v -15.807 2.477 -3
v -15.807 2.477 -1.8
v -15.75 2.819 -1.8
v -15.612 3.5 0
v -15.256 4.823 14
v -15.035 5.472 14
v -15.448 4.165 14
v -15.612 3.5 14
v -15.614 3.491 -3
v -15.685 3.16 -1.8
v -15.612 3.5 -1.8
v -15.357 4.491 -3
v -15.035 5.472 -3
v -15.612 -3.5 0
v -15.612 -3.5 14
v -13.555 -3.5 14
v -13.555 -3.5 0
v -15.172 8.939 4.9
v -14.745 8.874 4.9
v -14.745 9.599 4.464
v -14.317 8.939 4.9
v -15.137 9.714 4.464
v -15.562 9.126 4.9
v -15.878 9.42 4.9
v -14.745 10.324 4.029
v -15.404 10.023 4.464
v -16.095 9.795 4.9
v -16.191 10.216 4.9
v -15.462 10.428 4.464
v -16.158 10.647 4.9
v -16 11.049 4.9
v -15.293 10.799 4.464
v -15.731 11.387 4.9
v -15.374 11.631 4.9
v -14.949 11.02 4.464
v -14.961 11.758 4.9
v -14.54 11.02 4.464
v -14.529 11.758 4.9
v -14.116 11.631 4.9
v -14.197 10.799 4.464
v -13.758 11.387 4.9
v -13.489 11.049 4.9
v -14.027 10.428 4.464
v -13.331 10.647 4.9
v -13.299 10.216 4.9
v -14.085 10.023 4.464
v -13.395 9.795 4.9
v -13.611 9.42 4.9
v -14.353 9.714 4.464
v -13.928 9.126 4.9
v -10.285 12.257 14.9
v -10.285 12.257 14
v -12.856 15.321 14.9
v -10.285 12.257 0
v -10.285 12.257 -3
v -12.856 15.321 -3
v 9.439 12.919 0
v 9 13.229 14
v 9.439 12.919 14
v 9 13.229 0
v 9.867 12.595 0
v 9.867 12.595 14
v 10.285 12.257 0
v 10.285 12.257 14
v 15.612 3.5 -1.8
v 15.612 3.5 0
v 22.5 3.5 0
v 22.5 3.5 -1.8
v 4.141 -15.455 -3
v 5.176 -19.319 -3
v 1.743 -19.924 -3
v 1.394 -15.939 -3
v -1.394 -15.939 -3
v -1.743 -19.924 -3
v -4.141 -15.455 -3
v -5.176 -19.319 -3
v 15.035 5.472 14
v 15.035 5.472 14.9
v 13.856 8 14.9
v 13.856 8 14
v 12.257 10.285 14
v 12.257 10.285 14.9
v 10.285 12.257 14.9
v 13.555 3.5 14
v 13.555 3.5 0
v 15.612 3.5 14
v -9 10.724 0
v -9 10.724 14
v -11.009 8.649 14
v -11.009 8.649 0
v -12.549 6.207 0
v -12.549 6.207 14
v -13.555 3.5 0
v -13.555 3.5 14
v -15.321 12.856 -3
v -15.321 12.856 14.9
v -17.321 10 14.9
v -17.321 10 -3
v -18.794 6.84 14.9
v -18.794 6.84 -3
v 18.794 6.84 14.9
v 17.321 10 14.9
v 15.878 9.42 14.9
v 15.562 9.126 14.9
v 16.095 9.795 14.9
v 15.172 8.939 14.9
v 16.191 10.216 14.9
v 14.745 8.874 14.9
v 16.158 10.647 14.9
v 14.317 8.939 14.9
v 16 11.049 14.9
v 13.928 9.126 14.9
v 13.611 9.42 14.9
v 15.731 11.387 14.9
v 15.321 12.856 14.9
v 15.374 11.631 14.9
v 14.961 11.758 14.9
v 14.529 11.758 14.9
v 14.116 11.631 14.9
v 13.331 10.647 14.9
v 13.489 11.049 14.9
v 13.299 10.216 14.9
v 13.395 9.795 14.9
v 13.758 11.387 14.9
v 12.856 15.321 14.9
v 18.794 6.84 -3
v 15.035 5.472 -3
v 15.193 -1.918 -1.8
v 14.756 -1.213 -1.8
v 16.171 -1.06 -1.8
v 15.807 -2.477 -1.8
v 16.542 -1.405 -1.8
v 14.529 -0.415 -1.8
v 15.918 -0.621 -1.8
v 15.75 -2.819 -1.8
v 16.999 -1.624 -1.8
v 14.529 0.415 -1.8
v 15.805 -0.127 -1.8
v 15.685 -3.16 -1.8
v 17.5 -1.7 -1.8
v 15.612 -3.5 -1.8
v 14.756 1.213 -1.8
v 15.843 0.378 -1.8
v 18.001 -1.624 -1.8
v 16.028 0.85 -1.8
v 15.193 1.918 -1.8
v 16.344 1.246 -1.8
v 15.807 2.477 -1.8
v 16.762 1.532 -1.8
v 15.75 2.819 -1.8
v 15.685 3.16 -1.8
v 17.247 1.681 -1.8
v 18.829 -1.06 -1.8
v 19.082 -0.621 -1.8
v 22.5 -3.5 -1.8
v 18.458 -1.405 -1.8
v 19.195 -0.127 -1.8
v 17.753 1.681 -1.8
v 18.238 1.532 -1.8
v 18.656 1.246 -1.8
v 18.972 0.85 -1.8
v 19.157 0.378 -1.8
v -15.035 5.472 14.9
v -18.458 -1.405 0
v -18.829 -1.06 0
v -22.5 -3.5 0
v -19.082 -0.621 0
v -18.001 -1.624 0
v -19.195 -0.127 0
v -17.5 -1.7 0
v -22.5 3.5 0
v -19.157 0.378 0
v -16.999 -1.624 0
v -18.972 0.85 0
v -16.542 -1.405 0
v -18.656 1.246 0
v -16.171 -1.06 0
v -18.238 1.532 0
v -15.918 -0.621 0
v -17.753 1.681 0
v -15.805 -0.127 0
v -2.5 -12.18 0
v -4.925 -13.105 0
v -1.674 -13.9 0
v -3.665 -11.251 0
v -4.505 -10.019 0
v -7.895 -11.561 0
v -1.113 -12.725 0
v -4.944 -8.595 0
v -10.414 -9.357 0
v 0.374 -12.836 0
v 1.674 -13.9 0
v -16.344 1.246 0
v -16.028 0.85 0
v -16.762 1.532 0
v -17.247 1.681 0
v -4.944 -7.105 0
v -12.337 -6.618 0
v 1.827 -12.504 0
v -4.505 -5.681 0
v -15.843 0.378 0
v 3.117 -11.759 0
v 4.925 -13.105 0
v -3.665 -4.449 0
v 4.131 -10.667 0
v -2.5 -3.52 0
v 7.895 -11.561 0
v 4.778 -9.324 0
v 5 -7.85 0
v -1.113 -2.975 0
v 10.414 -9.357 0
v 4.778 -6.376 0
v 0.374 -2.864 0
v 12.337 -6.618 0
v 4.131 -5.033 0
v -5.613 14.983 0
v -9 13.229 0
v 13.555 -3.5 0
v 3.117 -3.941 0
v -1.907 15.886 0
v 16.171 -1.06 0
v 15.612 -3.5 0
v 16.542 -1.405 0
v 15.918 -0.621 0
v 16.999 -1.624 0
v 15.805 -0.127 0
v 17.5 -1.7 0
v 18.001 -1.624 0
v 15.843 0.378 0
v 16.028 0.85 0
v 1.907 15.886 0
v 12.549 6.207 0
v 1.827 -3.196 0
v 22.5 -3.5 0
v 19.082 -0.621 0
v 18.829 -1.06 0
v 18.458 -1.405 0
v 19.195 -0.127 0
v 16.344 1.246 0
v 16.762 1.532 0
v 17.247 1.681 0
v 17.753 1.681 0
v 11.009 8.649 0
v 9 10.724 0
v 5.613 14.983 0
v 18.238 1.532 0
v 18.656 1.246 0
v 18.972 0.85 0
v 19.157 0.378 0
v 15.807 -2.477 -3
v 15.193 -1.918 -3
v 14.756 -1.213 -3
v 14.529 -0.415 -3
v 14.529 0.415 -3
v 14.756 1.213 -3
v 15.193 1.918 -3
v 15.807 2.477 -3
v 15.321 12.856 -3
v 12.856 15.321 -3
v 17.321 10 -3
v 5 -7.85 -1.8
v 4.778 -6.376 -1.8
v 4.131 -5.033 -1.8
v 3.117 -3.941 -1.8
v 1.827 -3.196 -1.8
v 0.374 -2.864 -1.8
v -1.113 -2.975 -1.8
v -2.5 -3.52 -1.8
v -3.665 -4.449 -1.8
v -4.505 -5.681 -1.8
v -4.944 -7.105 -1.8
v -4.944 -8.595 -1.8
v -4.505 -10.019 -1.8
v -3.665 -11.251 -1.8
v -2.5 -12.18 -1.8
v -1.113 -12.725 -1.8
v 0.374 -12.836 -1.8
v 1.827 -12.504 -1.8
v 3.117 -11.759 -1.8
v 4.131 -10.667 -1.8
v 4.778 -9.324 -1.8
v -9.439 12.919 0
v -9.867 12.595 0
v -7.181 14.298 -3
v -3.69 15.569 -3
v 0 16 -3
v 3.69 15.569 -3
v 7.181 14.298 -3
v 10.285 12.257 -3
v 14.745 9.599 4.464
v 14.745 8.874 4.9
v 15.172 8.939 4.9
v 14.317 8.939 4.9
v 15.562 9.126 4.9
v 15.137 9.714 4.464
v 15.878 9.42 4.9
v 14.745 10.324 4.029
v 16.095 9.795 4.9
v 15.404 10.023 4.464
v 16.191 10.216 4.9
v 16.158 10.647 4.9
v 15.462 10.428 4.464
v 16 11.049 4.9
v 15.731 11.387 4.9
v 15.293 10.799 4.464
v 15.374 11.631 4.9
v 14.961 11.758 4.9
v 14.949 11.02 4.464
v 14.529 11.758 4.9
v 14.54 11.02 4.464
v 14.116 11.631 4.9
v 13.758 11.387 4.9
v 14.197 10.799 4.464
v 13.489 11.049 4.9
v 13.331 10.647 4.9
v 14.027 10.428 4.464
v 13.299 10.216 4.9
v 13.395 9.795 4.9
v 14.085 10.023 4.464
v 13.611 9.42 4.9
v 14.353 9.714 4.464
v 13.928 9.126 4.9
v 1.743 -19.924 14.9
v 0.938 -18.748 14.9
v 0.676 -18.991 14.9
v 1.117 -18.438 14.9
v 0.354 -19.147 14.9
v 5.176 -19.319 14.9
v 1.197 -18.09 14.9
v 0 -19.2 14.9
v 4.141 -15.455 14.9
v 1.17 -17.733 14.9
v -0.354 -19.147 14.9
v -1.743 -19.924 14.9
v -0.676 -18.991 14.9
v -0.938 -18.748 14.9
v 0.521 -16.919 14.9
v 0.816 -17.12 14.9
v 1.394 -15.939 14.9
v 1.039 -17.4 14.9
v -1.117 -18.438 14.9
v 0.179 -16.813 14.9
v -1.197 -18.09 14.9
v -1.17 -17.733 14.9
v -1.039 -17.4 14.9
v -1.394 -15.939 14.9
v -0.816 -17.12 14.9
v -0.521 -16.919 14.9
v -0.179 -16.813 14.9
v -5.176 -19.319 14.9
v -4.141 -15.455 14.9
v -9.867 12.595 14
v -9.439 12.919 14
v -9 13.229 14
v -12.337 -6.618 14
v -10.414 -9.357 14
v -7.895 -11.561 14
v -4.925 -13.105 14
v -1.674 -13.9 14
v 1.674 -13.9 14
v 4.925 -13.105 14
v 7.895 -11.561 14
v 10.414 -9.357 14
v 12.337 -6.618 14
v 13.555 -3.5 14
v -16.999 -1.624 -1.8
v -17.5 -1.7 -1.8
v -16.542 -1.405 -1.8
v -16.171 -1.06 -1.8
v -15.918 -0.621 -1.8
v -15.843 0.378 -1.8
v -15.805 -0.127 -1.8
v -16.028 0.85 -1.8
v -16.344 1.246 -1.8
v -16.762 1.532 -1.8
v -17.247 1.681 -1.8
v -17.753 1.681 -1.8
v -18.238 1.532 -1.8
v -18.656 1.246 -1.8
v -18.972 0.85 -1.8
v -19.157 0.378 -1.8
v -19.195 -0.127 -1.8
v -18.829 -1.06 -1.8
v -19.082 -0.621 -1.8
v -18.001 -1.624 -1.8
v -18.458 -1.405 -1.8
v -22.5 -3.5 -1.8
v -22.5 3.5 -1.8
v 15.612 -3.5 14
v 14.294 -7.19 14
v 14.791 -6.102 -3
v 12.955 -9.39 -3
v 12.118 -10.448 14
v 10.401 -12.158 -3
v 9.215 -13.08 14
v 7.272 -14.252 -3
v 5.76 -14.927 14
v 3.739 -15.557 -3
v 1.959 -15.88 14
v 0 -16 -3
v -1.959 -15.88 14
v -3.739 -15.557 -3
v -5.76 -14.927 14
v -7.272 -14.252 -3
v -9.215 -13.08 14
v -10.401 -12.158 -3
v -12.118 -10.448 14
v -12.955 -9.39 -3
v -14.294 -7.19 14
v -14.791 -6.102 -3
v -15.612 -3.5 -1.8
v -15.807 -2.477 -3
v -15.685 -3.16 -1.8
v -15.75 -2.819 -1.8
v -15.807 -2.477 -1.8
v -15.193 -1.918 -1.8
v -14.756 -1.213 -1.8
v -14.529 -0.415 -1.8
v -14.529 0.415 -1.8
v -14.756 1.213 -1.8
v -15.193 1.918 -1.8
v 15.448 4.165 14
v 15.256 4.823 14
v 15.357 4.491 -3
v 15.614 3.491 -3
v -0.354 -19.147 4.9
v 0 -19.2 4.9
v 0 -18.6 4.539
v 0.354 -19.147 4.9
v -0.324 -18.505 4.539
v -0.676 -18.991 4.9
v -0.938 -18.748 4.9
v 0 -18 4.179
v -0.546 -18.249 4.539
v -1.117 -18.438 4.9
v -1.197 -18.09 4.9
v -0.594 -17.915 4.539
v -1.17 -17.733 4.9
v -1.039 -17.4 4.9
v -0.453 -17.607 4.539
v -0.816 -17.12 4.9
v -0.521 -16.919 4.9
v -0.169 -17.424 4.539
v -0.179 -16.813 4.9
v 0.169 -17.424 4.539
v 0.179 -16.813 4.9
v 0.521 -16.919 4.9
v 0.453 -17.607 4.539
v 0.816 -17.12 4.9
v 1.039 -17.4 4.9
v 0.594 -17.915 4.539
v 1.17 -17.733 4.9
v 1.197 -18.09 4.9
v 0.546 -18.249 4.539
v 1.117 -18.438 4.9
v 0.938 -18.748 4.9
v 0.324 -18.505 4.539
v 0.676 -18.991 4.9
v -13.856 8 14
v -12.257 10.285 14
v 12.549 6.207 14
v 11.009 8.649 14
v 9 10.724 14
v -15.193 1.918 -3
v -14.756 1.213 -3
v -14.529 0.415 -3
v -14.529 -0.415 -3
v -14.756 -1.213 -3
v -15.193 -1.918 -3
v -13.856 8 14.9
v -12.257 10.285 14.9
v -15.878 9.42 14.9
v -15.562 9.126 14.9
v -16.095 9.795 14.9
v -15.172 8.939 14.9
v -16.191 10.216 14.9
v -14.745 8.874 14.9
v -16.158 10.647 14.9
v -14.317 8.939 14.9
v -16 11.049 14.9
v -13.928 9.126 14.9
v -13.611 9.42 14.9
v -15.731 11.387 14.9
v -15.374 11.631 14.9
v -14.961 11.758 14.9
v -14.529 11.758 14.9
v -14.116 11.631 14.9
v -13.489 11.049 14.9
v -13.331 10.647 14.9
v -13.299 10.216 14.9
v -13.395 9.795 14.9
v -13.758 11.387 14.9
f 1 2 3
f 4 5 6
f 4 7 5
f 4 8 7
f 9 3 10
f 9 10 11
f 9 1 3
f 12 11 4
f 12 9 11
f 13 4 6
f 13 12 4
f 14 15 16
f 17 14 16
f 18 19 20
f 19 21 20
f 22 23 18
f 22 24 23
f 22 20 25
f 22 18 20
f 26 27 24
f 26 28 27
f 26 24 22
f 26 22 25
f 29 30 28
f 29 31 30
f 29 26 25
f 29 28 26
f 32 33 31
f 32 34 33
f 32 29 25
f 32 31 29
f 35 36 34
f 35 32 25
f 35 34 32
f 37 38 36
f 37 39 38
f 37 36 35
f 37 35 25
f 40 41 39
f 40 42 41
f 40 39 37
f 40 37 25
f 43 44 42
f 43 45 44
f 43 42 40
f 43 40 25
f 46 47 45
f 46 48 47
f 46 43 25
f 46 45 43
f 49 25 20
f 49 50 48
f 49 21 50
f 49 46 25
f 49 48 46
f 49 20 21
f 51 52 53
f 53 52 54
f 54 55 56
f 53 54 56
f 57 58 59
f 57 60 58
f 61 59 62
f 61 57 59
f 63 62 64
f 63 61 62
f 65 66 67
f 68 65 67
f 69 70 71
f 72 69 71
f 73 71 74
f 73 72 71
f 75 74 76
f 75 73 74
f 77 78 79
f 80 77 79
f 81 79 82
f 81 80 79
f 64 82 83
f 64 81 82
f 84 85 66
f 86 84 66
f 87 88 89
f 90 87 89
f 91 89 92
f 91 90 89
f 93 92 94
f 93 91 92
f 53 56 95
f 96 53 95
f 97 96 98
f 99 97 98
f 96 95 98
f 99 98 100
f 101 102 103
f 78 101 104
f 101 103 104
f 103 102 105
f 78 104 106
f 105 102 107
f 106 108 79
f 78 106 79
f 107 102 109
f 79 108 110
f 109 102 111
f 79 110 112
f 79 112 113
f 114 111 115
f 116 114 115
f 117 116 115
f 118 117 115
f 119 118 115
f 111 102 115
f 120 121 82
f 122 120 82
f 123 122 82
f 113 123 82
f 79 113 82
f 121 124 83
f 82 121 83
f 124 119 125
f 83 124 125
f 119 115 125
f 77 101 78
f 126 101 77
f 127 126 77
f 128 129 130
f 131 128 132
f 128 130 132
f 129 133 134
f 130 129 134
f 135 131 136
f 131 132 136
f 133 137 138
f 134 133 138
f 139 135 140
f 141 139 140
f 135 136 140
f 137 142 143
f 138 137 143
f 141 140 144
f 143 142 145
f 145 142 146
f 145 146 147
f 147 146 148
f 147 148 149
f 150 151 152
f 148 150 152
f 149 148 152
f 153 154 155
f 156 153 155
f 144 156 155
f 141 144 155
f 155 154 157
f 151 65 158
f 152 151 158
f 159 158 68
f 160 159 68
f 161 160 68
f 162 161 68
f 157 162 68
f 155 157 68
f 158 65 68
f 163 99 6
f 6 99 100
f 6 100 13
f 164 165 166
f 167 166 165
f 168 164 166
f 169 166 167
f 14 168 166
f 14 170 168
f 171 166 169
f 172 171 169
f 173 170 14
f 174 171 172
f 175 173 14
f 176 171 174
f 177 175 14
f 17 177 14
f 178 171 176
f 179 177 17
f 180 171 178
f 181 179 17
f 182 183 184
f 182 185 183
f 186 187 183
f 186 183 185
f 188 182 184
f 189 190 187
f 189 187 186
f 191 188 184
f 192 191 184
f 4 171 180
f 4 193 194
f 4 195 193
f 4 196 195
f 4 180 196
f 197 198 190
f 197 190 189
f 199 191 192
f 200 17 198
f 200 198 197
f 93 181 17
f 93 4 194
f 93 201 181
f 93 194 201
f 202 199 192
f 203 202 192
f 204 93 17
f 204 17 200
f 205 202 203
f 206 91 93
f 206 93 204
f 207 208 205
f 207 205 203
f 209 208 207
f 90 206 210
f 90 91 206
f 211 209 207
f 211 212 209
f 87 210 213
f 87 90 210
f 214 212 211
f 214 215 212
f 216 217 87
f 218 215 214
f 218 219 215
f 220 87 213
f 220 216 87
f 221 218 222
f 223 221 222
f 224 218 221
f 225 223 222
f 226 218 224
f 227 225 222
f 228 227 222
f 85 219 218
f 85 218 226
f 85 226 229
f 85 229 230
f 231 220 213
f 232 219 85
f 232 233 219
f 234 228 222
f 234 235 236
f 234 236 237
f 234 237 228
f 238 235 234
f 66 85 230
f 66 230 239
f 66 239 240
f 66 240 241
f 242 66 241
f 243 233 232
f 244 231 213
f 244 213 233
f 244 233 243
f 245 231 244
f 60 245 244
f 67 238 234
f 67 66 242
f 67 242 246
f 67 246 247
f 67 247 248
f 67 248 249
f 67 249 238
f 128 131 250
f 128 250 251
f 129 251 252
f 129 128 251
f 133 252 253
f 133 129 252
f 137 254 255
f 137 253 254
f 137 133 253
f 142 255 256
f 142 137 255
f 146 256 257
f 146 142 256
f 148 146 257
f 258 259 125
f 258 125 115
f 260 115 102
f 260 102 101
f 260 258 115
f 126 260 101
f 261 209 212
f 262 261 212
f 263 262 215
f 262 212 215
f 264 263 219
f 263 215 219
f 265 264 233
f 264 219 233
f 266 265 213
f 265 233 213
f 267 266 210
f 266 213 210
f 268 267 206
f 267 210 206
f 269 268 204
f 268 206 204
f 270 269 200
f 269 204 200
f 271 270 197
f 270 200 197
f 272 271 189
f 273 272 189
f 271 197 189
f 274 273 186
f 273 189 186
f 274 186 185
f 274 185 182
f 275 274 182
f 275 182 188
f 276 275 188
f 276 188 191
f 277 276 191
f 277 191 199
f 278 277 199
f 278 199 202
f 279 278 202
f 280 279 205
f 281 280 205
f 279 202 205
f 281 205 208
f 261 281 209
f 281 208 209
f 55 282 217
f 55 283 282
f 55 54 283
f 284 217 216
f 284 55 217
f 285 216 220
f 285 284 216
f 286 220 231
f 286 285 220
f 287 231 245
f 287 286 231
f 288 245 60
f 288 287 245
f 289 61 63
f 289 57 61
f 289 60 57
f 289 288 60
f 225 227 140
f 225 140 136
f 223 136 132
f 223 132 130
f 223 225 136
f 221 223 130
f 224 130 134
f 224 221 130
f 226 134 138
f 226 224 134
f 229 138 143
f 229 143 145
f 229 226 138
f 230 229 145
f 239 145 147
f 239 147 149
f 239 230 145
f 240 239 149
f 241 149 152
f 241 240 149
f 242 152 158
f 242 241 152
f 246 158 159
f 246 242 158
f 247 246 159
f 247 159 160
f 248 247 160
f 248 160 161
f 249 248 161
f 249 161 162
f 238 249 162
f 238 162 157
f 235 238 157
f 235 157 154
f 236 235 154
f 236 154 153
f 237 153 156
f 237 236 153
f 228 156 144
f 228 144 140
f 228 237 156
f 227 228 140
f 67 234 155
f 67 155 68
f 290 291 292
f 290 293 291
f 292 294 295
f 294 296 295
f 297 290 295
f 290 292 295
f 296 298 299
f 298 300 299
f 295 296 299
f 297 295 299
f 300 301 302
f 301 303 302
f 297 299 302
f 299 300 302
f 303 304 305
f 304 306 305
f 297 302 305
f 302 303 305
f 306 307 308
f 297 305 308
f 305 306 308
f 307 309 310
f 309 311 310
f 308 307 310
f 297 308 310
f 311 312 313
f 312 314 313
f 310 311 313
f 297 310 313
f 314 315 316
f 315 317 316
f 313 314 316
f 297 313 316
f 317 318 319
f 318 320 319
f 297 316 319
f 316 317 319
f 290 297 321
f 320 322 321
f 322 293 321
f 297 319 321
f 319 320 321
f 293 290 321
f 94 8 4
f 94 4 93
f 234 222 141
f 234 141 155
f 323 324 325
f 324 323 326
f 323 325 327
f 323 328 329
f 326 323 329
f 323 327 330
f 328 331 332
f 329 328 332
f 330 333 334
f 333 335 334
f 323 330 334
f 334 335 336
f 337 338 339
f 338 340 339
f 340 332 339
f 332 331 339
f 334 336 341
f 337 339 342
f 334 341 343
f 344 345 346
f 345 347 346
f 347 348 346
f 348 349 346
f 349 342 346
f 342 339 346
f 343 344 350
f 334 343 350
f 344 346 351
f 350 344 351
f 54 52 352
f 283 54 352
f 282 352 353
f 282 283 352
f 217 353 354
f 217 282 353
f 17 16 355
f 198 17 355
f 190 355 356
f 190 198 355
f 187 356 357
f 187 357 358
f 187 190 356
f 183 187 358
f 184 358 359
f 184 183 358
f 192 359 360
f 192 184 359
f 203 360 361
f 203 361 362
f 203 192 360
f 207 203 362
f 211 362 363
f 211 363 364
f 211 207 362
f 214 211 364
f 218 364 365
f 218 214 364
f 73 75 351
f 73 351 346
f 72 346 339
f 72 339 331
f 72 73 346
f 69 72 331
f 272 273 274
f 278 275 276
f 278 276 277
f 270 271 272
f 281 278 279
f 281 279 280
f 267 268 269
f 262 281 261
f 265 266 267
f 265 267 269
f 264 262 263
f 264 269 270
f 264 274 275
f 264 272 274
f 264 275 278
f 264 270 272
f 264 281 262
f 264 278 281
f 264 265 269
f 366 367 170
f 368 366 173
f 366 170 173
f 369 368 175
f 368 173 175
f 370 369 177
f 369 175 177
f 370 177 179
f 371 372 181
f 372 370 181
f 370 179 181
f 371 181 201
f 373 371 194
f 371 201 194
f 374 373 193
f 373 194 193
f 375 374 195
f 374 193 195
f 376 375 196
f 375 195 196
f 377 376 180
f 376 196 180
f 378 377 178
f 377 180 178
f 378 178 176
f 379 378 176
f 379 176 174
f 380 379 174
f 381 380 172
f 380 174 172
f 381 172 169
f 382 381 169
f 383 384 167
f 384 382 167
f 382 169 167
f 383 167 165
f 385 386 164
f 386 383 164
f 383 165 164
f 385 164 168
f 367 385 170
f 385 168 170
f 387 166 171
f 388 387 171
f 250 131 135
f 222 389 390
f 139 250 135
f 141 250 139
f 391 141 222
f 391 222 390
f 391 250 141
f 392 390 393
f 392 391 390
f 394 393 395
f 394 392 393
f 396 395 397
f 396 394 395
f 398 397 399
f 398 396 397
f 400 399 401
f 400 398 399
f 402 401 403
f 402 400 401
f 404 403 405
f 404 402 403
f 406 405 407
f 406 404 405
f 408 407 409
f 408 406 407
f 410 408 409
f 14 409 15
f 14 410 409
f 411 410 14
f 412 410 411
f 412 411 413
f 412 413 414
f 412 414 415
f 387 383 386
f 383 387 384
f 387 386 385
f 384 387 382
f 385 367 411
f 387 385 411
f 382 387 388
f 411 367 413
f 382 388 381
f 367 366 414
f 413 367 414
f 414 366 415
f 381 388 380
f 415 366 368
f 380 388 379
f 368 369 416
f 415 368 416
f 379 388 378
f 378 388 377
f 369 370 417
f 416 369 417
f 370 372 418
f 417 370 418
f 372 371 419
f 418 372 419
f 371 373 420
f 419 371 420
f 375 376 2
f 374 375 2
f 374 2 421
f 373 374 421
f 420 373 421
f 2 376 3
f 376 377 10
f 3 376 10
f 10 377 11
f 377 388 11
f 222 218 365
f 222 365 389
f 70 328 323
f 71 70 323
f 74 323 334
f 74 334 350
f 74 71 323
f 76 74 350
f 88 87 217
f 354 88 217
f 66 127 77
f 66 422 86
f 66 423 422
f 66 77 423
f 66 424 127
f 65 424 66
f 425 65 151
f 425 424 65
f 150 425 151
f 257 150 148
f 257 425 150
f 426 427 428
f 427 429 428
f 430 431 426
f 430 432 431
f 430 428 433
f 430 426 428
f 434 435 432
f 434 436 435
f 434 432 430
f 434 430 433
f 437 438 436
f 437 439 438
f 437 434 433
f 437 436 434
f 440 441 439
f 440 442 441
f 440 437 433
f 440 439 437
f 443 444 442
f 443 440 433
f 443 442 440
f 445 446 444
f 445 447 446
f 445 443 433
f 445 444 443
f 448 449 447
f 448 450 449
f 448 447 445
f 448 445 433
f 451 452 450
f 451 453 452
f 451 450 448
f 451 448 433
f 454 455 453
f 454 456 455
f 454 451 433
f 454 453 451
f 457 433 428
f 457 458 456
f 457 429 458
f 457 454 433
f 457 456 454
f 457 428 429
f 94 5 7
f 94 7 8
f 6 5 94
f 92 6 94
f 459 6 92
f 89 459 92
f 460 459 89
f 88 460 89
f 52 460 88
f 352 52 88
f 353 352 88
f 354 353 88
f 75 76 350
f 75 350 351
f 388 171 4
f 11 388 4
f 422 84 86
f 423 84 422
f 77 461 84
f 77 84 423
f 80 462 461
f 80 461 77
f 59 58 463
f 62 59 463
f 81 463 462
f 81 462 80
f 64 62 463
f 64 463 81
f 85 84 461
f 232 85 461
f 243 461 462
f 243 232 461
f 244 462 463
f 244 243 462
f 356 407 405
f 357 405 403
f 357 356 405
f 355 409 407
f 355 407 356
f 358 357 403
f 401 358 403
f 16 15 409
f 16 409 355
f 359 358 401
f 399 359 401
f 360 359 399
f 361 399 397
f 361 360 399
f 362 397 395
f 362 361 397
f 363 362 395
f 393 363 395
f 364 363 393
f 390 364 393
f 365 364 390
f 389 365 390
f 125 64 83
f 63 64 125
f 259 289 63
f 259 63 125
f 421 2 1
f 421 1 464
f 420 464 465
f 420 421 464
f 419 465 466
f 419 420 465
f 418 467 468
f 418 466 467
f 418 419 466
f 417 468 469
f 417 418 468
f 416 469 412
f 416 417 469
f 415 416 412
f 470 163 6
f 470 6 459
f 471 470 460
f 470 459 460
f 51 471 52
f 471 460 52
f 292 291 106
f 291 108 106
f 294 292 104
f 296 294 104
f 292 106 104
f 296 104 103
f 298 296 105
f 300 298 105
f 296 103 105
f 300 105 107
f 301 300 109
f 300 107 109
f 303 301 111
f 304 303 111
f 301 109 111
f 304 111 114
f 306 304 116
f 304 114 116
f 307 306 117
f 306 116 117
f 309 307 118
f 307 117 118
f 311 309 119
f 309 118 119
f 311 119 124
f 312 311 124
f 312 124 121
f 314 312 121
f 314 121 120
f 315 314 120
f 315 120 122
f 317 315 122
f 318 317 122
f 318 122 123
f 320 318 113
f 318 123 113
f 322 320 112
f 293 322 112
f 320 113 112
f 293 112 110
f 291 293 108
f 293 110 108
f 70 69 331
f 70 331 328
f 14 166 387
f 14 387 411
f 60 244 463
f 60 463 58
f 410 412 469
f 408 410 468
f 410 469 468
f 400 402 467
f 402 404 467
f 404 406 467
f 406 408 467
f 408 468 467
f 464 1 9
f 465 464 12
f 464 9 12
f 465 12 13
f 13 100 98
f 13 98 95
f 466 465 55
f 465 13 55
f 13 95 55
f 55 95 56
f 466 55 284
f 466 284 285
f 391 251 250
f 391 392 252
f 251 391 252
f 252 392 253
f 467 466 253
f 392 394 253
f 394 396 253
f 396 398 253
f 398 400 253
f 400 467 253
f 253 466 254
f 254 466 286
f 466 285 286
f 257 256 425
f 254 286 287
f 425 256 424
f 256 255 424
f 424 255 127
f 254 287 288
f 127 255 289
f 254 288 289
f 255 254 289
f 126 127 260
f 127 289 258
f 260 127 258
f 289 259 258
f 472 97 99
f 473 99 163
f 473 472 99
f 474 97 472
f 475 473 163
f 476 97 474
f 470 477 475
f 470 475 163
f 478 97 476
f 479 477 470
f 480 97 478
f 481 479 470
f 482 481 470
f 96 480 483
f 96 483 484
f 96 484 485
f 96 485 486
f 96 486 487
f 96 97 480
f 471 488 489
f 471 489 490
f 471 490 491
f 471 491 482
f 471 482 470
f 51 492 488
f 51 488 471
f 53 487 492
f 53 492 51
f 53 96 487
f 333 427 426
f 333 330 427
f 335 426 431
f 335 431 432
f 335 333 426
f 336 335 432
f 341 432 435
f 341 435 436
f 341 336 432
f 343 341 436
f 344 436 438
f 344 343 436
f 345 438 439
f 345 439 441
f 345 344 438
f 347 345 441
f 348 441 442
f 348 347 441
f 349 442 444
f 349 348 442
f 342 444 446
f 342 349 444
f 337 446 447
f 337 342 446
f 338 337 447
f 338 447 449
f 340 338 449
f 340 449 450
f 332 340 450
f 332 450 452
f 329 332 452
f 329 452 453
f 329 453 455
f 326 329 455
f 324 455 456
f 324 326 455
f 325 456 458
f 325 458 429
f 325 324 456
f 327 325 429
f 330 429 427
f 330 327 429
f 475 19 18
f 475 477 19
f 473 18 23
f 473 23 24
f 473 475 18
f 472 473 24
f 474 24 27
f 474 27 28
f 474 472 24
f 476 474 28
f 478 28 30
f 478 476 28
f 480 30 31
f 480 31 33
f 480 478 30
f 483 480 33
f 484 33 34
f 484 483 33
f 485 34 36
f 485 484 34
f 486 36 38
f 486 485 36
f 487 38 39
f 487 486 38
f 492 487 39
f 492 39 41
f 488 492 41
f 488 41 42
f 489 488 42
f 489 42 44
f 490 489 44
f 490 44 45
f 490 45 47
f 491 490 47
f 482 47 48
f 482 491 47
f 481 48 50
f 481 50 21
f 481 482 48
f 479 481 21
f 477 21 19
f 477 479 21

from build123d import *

# Parameters (mm, degrees)
SCHIZZO1_R                   = 16
SCHIZZO1_R_2                 = 14
ESTRUSIONE_ESTRUSIONE1_DEPTH = 14
ESTRUSIONE_ESTRUSIONE2_START = 3
SCHIZZO2_R                   = 16
ESTRUSIONE_ESTRUSIONE2_DEPTH = 3
SCHIZZO3_W                   = 32
SCHIZZO3_H                   = 7
TAGLIO_ESTRUSIONE1_DEPTH     = 14
SCHIZZO4_W                   = 45
SCHIZZO4_H                   = 7
ESTRUSIONE_ESTRUSIONE3_DEPTH = 1.8
SCHIZZO6_W                   = 18
SCHIZZO6_H                   = 16
TAGLIO_ESTRUSIONE2_DEPTH     = 14
SCHIZZO7_R                   = 5
TAGLIO_ESTRUSIONE3_DEPTH     = 1.8
ESTRUSIONE_ESTRUSIONE4_DEPTH = 17.9
ESTRUSIONE_ESTRUSIONE6_DEPTH = 17.9
SCHIZZO21_R                  = 3
TAGLIO_ESTRUSIONE4_DEPTH     = 10


with BuildPart() as part:
    # Schizzo1 → Estrusione-Estrusione1 (new body)
    with BuildSketch(Plane.XY):
        Circle(SCHIZZO1_R)
        Circle(SCHIZZO1_R_2, mode=Mode.SUBTRACT)
    extrude(amount=ESTRUSIONE_ESTRUSIONE1_DEPTH)

    # Schizzo2 → Estrusione-Estrusione2 (add)
    with BuildSketch(Plane(origin=(0, 0, 0), x_dir=(-1, 0, 0), z_dir=(0, 0, -1)).offset(ESTRUSIONE_ESTRUSIONE2_START)):
        Circle(SCHIZZO2_R)
    extrude(amount=-ESTRUSIONE_ESTRUSIONE2_DEPTH)

    # Schizzo3 → Taglio-Estrusione1 (cut)
    with BuildSketch(Plane.XY):
        Rectangle(SCHIZZO3_W, SCHIZZO3_H)
    extrude(amount=TAGLIO_ESTRUSIONE1_DEPTH, mode=Mode.SUBTRACT)

    # Schizzo4 → Estrusione-Estrusione3 (add)
    with BuildSketch(Plane.XY):
        Rectangle(SCHIZZO4_W, SCHIZZO4_H)
    extrude(amount=-ESTRUSIONE_ESTRUSIONE3_DEPTH)

    # Schizzo6 → Taglio-Estrusione2 (cut)
    with BuildSketch(Plane.XY):
        with Locations((0, 8)):
            Rectangle(SCHIZZO6_W, SCHIZZO6_H)
    extrude(amount=TAGLIO_ESTRUSIONE2_DEPTH, mode=Mode.SUBTRACT)

    # Schizzo7 → Taglio-Estrusione3 (cut)
    with BuildSketch(Plane.XY):
        with Locations((0, -7.85)):
            Circle(SCHIZZO7_R)
    extrude(amount=-TAGLIO_ESTRUSIONE3_DEPTH, mode=Mode.SUBTRACT)

    # Schizzo9 → Foro per Vite M3-1 (revolve, cut)
    with BuildSketch(Plane(origin=(17.5, 0, 0), x_dir=(0, -1, 0), z_dir=(1, 0, 0))):
        Polygon((0, 0), (0, 11.021463052), (1.7, 10), (1.7, 0), align=None)
    foro_per_vite_m3_1 = revolve(axis=Axis((17.5, 0, 6.35), (0, 0, -1)), mode=Mode.SUBTRACT)

    # Specchia1: Foro per Vite M3-1 across plane
    add(foro_per_vite_m3_1.mirror(Plane(origin=(0, 0, 0), x_dir=(0, 0, 1), z_dir=(1, 0, 0))), mode=Mode.SUBTRACT)

    # Schizzo11 → Estrusione-Estrusione4 (add)
    with BuildSketch(Plane(origin=(0, 0, -3), x_dir=(-1, 0, 0), z_dir=(0, 0, -1))):
        with BuildLine():
            Line((-10.284601755, 12.25671109), (-12.855752194, 15.320888862))
            ThreePointArc((-12.855752194, 15.320888862), (-16.383040886, 11.471528727), (-18.793852416, 6.840402867))
            Line((-18.793852416, 6.840402867), (-15.035081933, 5.472322293))
            ThreePointArc((-15.035081933, 5.472322293), (-13.106432709, 9.177222982), (-10.284601755, 12.25671109))
        make_face()
    estrusione_estrusione4 = extrude(amount=-ESTRUSIONE_ESTRUSIONE4_DEPTH)

    # Specchia2: Estrusione-Estrusione4 across plane
    add(estrusione_estrusione4.mirror(Plane(origin=(0, 0, 0), x_dir=(0, 0, 1), z_dir=(1, 0, 0))))

    # Schizzo16 → Foro per Vite M2.5-1 (revolve, cut)
    with BuildSketch(Plane(origin=(-14.744736797, 10.324375854, 14.9), x_dir=(0, -1, 0), z_dir=(1, 0, 0))):
        Polygon((0, 0), (0, 10.871247898), (1.45, 10), (1.45, 0), align=None)
    foro_per_vite_m2_5_1 = revolve(axis=Axis((-14.744736797, 10.324375854, 21.25), (0, 0, -1)), mode=Mode.SUBTRACT)

    # Specchia3: Foro per Vite M2.5-1 across plane
    add(foro_per_vite_m2_5_1.mirror(Plane(origin=(0, 0, 0), x_dir=(0, 0, 1), z_dir=(1, 0, 0))), mode=Mode.SUBTRACT)

    # Schizzo21 → Taglio-Estrusione4 (cut)
    with BuildSketch(Plane(origin=(0, 0, -1.8), x_dir=(-1, 0, 0), z_dir=(0, 0, -1))):
        with Locations((-17.5, 0)):
            Circle(SCHIZZO21_R)
        with Locations((17.5, 0)):
            Circle(SCHIZZO21_R)
    extrude(amount=TAGLIO_ESTRUSIONE4_DEPTH, mode=Mode.SUBTRACT)


with BuildPart() as body_2:
    # Schizzo13 → Estrusione-Estrusione6 (new body)
    with BuildSketch(Plane(origin=(0, 0, -3), x_dir=(-1, 0, 0), z_dir=(0, 0, -1))):
        with BuildLine():
            Line((-4.141104722, -15.454813221), (-5.176380902, -19.318516526))
            ThreePointArc((-5.176380902, -19.318516526), (0, -20), (5.176380902, -19.318516526))
            Line((5.176380902, -19.318516526), (4.141104722, -15.454813221))
            ThreePointArc((4.141104722, -15.454813221), (0, -16), (-4.141104722, -15.454813221))
        make_face()
    extrude(amount=-ESTRUSIONE_ESTRUSIONE6_DEPTH)

    # Schizzo20 → Foro per Vite M2-1 (revolve, cut)
    with BuildSketch(Plane(origin=(0, -18, 14.9), x_dir=(0, -1, 0), z_dir=(1, 0, 0))):
        Polygon((0, 0), (0, 10.721032743), (1.2, 10), (1.2, 0), align=None)
    revolve(axis=Axis((0, -18, 21.25), (0, 0, -1)), mode=Mode.SUBTRACT)


solid = Compound([part.part, body_2.part])
